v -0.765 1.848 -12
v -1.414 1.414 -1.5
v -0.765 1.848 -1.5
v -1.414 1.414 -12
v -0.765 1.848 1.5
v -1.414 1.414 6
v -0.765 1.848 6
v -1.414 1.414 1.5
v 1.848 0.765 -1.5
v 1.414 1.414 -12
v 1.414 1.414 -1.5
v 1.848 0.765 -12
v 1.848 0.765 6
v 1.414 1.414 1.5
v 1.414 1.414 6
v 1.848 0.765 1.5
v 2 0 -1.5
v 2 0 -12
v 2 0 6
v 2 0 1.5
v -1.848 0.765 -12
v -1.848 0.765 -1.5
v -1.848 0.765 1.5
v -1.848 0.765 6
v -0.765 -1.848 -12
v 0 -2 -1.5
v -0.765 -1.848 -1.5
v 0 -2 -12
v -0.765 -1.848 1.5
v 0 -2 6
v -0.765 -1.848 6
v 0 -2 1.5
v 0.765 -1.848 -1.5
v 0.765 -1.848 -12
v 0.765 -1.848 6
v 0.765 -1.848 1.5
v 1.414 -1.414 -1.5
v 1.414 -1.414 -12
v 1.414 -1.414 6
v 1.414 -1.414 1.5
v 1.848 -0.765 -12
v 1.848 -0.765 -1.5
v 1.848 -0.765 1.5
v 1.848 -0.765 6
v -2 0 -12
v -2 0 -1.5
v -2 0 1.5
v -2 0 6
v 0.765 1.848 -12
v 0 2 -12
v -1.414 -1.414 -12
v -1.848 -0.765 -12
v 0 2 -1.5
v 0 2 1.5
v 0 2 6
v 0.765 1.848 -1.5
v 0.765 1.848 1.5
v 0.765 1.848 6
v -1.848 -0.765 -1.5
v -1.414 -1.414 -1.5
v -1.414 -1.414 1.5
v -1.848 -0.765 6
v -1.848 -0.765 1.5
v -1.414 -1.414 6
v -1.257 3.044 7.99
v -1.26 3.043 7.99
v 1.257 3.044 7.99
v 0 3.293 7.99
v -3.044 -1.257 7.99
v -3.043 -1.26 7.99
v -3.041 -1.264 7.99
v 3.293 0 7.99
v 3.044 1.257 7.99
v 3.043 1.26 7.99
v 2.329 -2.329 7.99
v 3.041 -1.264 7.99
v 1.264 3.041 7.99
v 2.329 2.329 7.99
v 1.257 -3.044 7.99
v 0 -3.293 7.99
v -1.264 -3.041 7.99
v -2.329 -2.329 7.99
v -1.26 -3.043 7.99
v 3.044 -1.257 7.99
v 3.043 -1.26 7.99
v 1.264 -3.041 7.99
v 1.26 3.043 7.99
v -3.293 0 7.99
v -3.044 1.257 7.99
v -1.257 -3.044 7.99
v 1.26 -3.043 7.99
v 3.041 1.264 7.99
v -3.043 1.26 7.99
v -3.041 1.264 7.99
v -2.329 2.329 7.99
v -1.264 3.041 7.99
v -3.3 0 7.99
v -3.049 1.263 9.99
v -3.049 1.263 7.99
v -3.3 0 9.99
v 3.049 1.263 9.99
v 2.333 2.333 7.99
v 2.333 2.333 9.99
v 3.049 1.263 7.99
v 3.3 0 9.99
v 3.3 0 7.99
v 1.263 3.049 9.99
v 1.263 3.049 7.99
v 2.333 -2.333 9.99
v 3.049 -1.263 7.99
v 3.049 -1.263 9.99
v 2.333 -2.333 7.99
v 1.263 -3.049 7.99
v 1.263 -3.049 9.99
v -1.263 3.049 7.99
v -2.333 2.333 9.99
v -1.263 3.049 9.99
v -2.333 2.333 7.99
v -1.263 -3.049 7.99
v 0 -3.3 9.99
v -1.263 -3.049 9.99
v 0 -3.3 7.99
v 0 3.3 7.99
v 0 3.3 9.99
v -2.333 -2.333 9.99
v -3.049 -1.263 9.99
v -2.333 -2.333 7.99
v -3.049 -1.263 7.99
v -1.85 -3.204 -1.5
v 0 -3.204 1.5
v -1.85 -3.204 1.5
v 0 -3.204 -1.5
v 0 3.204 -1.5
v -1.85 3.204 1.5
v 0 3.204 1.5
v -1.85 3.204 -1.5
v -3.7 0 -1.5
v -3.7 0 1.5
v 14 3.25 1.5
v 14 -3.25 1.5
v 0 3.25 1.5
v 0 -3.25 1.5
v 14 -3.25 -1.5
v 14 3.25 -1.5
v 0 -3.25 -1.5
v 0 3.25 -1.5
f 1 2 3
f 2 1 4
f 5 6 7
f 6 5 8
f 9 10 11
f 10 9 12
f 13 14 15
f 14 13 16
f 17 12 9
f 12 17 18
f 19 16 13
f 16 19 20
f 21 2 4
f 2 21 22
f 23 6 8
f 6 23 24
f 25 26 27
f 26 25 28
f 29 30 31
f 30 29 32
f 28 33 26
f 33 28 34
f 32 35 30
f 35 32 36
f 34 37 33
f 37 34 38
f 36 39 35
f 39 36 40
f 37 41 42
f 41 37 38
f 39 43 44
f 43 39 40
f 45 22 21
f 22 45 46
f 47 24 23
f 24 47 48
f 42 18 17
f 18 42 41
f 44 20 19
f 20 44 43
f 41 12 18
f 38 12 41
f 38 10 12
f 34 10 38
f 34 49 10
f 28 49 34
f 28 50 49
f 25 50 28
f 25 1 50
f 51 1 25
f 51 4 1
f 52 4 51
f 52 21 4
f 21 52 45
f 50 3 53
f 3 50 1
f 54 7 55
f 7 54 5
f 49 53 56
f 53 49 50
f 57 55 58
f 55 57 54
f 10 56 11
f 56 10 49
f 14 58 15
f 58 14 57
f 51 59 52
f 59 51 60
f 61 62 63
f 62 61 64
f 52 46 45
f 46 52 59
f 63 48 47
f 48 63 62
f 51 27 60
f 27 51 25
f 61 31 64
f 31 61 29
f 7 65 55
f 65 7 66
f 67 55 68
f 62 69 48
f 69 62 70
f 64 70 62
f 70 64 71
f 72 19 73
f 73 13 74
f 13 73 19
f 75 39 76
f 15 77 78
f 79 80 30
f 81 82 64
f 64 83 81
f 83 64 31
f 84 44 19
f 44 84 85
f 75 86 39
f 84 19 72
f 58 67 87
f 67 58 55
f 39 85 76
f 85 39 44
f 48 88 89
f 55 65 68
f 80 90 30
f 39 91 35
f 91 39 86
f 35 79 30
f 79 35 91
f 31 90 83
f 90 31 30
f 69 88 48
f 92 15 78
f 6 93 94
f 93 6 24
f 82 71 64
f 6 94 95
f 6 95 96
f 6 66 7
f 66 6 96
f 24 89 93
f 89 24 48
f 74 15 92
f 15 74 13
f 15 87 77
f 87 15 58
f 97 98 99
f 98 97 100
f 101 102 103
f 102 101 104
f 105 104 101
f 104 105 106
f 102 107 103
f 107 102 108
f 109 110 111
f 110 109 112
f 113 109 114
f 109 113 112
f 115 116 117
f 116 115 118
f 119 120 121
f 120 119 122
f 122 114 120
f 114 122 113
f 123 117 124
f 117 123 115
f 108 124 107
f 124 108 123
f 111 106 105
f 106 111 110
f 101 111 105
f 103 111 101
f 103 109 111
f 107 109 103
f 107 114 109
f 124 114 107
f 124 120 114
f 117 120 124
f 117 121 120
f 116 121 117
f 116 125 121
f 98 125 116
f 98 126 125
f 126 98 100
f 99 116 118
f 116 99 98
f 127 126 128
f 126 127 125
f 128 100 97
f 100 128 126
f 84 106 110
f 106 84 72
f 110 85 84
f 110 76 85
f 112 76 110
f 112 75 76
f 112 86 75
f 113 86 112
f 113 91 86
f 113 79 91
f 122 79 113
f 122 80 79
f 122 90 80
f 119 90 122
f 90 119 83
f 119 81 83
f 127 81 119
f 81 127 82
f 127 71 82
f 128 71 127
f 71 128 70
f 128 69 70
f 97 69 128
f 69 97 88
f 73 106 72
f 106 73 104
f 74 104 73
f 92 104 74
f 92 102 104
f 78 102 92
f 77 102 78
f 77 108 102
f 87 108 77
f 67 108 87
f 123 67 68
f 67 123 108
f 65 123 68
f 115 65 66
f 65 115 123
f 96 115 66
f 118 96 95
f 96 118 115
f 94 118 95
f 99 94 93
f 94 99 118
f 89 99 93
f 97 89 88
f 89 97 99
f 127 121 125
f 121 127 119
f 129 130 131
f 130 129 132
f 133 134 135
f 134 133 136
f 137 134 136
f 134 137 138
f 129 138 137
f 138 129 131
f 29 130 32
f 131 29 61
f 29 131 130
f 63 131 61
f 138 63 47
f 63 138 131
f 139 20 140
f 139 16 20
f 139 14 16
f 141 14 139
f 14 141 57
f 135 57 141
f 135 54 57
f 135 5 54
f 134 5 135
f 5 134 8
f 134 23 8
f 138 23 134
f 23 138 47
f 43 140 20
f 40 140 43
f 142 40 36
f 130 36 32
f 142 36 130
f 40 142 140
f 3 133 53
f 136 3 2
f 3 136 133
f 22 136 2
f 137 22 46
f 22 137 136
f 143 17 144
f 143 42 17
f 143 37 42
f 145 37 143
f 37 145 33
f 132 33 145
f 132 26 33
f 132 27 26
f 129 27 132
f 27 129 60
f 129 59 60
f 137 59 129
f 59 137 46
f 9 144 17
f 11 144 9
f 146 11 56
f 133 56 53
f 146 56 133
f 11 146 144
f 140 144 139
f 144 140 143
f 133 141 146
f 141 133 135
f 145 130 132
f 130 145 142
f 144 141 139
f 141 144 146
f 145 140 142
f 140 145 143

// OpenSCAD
// file: linurs_screw_dim.scad
// Metric screws and nuts 
// urs@linurs.org 2015

// contains dimensions of linurs_screw and can be included in other 
// OpenScad files 


// Consistent parameters in this file
// d screw diameter M2_5, M3, ... (enumeration with screw_d)
// t millimeters added to diameters 
//   For the screw, head, nut = 0. 
//   For the piece where the screw, nut, ... passes through = 0.5 so it slides in well

// enumerations of metric threads
M2_5=0;
M3=1;
M4=2;
M5=3;

// enumerations screw head type
head_cyl=0; // cylinder
head_cnt=1; // countrsunk
head_no=2;  // no head at all
head_hex=3;  // no head at all

// screw diameters
screw_d=[
2.5, // M2.5
3.0, // M3
4.0, // M4
5.0  // M5
];

// sizes for hex nuts
screw_hex=[
//   s,   e,   h
 [ 5.0, 5.8, 1.7], // M2.5
 [ 5.5, 6.4, 2.0], // M3
 [ 7.0, 8.1, 2.8], // M4
 [ 8.0, 9.2, 3.5]  // M5
];

// sizes for cylinder screw heads
screw_cyl=[
//   d,   h
 [ 4.5, 1.6], // M2.5
 [ 5.5, 2.0], // M3
 [ 7.0, 2.6], // M4
 [ 8.5, 3.3]  // M5
];

// sizes for countersunk screw heads
screw_cnt=[
//   d,   h
 [ 4.7, 1.50], // M2.5
 [ 5.6, 1.65], // M3
 [ 7.4, 2.20], // M4
 [ 9.2, 2.50]  // M5
];
// main file
// Metric screws and nuts 
// urs@linurs.org 2015
// It is targeted for 3D printing applications. 
// To look realistic is not the goal (Example: Nuts do not have a hole)

include <linurs_screw_dim.scad>

// Changes
//2019-02-09 split in two files
//2017-05-19 bug fix hexbolt had wrong diameter
//2017-01-22 bug fix lentgh of hex scre is outer lenght as other screw types
//2017-01-06 added hex screw
//2015-10-12 added screw_cut
//2015-11-29 screw_fix parameter sunk added, and module hex_bolt

// Consistent parameters in this file
// d screw diameter M2_5, M3, ... (enumeration with screw_d)
// t millimeters added to diameters 
//   For the screw, head, nut = 0. 
//   For the piece where the screw, nut, ... passes through = 0.5 so it slides in well

// functions used multiple times to position nuts and heads
function headh_cyl(d)=screw_cyl[d][1];  // height of cyl screw head
function headh_cnt(d)=screw_cyl[d][1];  // height of cnt screw head
function headh(d,type=head_cyl)=(type==head_cyl ? headh_cyl(d) : (type==head_cnt ? headh_cnt(d) : 0 )); // height of screw head 

function nuth(d)=screw_hex[d][2];   // height of hex nut

// head of a cylinder screw
module screw_head_cyl(d=M3, t=0)
{
  screwhd=screw_cyl[d][0]+t; // diameter of cylinder screw head
  cylinder(d=screwhd,h=headh(d=d, type=head_cyl), center=true,$fn=16); // screw head
}

// head of a countersunk screw
module screw_head_cnt(d=M3, t=0)
{
  screwd=screw_d[d]+t; 
  screwhd=screw_cnt[d][0]+t; // diameter of cylinder screw head
  cylinder(d1=screwd,d2=screwhd,h=headh(d=d,type=head_cnt), center=true,$fn=16); // screw head
}

// head of a hex screw
module screw_head_hex(d=M3, t=0)
{
    translate([0,0,-nuth(d)/2])nut(d=d, t=t);
}

// head of all screws
module screw_head(d=M3, type=head_cyl, t=0)
{ 
  if(type==head_cnt){
    screw_head_cnt(d=d, t=t);
  } else {
    if(type==head_cyl){
      screw_head_cyl(d=d, t=t);
    } else {
       if(type==head_hex){
           screw_head_hex(d=d, t=t); 
       } 
    }    
  }
}

// hex bolt 
module hex_bolt(d=M3, h=10, t=0)
{
  nutd=screw_hex[d][1]+t; // outer diameter of hex bolt
  cylinder(r=nutd/2,h=h+t, center=true,$fn=6); // nut
}

// nut 
module nut(d=M3, t=0)
{
  hex_bolt(d=d, h=nuth(d), t=t);    
}

// screw 
// w outer width of the screw = screw length + head 
module screw(w=10, d=M3, type=head_cyl, t=0){
  screwd=screw_d[d]+t;       // screw diameter
  cylinder(d=screwd, h=w, center=true,$fn=16); // screw thread length
  translate([0,0,w/2-headh(d=d,type=type)/2])
  screw_head(d=d,type=type, t=t);
}

// screw fix
// w outer width of the screw = screw length + head 
// sink additional material below to remove 
// raise additional material above to remove
module screw_fix(w=10, d=M3, type=head_cyl, sink=0, raise=0, t=0){
  screw(w=w-sink*2, d=d, type=type, t=t);
  translate([0,0,-(w-sink*2)/2+nuth(d)/2])
    nut(d=d,t=t);
  translate([0,0,-(w-sink+raise)/2])hex_bolt(d=d,h=sink+raise,t=t);    
  if(type==head_cnt){  
    translate([0,0,(w-sink+raise)/2])
    cylinder(d=screw_cnt[d][0]+t,h=sink+raise,center=true,$fn=16);
  }else{ 
    translate([0,0,(w-sink+raise)/2])
    cylinder(d=screw_cyl[d][0]+t,h=sink+raise,center=true,$fn=16);
  }     
}
//screw_fix();
//translate([10,0,0])screw_fix(sink=2,type=head_cnt);
//translate([-10,0,0])screw_fix(raise=2,type=head_cnt);

// screw cut
// material to be extracted from object to slide in a counter sunk screw for fixation
// w height of the cut out
// i depth of the screw
module screw_cut(d=M3,w=20,i=10,t=0,fn=32){
    hsh=screw_cnt[d][1];
    ws=screw_cnt[d][0]+t;
    ds=screw_d[d]+t;
    
    translate([i/2,0,-(w-hsh)/2])
      cube([i,ws,hsh],center=true);
    
    translate([0,0,-(w-hsh)/2])
      cylinder(d=ws,h=hsh,center=true,$fn=32);
    
    translate([0,0,-(w-hsh)/2+hsh])
        cylinder(d2=ds, d1=ws, h=hsh,center=true,$fn=fn);
    
    cylinder(h=w, d=ds, center=true, $fn=fn);   
    
    translate([i/2,0,0]) 
        cube([i,ds,w],center=true);
    
    for(y=[-1,1]){
        translate([i/2,y*ds/2,-w/2+hsh])
            rotate([45,0,0])
            cube([i,sqrt(2)*(ws-ds)/2,sqrt(2)*(ws-ds)/2],center=true);
    }
}
//screw_cut();

// nut cut
// material to be extracted from object to slide in a nut for fixation
// w height of the cylinder
// i lenght of the inlet
module nut_cut(w=10, wi=0, d=M3, i=10, t=0, raise=0, type=head_cyl){ 
  nut(d,t);
  translate([i/2,0,0])
    cube([i,screw_hex[d][0]+t,nuth(d)+t],center=true);
  translate([0,0,-wi])
      if(type==head_cnt){    
          screw(w=w, d=d, type=type, t=t); 
        translate([0,0,(w+raise)/2-0.01])
          cylinder(d=screw_cnt[d][0]+t,h=raise,center=true,$fn=16);
      }else{ 
          screw(w=w, d=d, type=type, t=t);   
        translate([0,0,(w+raise)/2-0.01])
          cylinder(d=screw_cyl[d][0]+t,h=raise,center=true,$fn=16);
      }       
}
//
nut_cut(raise=2,type=head_cnt,i=14,w=20,wi=2, t=1);

// present the library
show=0;

if(show==1){
    grid=20;
    
    for (j=[0:10]){
        for (i=[0:3])
           translate([j*grid,i*grid,0]){  
           
    // elements           
           if(j==0){
             screw_fix(w=(i+2)*5,d=i, type=head_cyl, t=0);
           }
       
           if(j==1){
             nut(d=i,t=0);
           } 
       
           if(j==2){   
              screw(d=i,t=0);
           } 
           
           if(j==3){   
              screw(d=i,t=0,type=head_cnt);
           } 
           
           if(j==4){   
              screw(d=i,t=0,type=head_hex);
           } 
           
           if(j==5){   
              hex_bolt(d=i,t=0);
           } 
           
       }
    }   
     
    for (j=[0:2]){
        for (i=[0:3])
           translate([j*grid,-(i+1)*grid,0]){  
             difference(){
                cube([3*screw_d[i],3*screw_d[i],(i+2)*5-0.1],center=true);    
    
                if(j==0){
                  screw_fix(w=(i+2)*5,d=i,type=head_cnt, t=0.5);
                }   
                
                if(j==1){
                  nut_cut(d=i,w=(i+2)*5);
                }
                if(j==2){
                  screw_cut(d=1,w=(i+2)*5);
                }
            
             }
           }  
        
    }
}
   
